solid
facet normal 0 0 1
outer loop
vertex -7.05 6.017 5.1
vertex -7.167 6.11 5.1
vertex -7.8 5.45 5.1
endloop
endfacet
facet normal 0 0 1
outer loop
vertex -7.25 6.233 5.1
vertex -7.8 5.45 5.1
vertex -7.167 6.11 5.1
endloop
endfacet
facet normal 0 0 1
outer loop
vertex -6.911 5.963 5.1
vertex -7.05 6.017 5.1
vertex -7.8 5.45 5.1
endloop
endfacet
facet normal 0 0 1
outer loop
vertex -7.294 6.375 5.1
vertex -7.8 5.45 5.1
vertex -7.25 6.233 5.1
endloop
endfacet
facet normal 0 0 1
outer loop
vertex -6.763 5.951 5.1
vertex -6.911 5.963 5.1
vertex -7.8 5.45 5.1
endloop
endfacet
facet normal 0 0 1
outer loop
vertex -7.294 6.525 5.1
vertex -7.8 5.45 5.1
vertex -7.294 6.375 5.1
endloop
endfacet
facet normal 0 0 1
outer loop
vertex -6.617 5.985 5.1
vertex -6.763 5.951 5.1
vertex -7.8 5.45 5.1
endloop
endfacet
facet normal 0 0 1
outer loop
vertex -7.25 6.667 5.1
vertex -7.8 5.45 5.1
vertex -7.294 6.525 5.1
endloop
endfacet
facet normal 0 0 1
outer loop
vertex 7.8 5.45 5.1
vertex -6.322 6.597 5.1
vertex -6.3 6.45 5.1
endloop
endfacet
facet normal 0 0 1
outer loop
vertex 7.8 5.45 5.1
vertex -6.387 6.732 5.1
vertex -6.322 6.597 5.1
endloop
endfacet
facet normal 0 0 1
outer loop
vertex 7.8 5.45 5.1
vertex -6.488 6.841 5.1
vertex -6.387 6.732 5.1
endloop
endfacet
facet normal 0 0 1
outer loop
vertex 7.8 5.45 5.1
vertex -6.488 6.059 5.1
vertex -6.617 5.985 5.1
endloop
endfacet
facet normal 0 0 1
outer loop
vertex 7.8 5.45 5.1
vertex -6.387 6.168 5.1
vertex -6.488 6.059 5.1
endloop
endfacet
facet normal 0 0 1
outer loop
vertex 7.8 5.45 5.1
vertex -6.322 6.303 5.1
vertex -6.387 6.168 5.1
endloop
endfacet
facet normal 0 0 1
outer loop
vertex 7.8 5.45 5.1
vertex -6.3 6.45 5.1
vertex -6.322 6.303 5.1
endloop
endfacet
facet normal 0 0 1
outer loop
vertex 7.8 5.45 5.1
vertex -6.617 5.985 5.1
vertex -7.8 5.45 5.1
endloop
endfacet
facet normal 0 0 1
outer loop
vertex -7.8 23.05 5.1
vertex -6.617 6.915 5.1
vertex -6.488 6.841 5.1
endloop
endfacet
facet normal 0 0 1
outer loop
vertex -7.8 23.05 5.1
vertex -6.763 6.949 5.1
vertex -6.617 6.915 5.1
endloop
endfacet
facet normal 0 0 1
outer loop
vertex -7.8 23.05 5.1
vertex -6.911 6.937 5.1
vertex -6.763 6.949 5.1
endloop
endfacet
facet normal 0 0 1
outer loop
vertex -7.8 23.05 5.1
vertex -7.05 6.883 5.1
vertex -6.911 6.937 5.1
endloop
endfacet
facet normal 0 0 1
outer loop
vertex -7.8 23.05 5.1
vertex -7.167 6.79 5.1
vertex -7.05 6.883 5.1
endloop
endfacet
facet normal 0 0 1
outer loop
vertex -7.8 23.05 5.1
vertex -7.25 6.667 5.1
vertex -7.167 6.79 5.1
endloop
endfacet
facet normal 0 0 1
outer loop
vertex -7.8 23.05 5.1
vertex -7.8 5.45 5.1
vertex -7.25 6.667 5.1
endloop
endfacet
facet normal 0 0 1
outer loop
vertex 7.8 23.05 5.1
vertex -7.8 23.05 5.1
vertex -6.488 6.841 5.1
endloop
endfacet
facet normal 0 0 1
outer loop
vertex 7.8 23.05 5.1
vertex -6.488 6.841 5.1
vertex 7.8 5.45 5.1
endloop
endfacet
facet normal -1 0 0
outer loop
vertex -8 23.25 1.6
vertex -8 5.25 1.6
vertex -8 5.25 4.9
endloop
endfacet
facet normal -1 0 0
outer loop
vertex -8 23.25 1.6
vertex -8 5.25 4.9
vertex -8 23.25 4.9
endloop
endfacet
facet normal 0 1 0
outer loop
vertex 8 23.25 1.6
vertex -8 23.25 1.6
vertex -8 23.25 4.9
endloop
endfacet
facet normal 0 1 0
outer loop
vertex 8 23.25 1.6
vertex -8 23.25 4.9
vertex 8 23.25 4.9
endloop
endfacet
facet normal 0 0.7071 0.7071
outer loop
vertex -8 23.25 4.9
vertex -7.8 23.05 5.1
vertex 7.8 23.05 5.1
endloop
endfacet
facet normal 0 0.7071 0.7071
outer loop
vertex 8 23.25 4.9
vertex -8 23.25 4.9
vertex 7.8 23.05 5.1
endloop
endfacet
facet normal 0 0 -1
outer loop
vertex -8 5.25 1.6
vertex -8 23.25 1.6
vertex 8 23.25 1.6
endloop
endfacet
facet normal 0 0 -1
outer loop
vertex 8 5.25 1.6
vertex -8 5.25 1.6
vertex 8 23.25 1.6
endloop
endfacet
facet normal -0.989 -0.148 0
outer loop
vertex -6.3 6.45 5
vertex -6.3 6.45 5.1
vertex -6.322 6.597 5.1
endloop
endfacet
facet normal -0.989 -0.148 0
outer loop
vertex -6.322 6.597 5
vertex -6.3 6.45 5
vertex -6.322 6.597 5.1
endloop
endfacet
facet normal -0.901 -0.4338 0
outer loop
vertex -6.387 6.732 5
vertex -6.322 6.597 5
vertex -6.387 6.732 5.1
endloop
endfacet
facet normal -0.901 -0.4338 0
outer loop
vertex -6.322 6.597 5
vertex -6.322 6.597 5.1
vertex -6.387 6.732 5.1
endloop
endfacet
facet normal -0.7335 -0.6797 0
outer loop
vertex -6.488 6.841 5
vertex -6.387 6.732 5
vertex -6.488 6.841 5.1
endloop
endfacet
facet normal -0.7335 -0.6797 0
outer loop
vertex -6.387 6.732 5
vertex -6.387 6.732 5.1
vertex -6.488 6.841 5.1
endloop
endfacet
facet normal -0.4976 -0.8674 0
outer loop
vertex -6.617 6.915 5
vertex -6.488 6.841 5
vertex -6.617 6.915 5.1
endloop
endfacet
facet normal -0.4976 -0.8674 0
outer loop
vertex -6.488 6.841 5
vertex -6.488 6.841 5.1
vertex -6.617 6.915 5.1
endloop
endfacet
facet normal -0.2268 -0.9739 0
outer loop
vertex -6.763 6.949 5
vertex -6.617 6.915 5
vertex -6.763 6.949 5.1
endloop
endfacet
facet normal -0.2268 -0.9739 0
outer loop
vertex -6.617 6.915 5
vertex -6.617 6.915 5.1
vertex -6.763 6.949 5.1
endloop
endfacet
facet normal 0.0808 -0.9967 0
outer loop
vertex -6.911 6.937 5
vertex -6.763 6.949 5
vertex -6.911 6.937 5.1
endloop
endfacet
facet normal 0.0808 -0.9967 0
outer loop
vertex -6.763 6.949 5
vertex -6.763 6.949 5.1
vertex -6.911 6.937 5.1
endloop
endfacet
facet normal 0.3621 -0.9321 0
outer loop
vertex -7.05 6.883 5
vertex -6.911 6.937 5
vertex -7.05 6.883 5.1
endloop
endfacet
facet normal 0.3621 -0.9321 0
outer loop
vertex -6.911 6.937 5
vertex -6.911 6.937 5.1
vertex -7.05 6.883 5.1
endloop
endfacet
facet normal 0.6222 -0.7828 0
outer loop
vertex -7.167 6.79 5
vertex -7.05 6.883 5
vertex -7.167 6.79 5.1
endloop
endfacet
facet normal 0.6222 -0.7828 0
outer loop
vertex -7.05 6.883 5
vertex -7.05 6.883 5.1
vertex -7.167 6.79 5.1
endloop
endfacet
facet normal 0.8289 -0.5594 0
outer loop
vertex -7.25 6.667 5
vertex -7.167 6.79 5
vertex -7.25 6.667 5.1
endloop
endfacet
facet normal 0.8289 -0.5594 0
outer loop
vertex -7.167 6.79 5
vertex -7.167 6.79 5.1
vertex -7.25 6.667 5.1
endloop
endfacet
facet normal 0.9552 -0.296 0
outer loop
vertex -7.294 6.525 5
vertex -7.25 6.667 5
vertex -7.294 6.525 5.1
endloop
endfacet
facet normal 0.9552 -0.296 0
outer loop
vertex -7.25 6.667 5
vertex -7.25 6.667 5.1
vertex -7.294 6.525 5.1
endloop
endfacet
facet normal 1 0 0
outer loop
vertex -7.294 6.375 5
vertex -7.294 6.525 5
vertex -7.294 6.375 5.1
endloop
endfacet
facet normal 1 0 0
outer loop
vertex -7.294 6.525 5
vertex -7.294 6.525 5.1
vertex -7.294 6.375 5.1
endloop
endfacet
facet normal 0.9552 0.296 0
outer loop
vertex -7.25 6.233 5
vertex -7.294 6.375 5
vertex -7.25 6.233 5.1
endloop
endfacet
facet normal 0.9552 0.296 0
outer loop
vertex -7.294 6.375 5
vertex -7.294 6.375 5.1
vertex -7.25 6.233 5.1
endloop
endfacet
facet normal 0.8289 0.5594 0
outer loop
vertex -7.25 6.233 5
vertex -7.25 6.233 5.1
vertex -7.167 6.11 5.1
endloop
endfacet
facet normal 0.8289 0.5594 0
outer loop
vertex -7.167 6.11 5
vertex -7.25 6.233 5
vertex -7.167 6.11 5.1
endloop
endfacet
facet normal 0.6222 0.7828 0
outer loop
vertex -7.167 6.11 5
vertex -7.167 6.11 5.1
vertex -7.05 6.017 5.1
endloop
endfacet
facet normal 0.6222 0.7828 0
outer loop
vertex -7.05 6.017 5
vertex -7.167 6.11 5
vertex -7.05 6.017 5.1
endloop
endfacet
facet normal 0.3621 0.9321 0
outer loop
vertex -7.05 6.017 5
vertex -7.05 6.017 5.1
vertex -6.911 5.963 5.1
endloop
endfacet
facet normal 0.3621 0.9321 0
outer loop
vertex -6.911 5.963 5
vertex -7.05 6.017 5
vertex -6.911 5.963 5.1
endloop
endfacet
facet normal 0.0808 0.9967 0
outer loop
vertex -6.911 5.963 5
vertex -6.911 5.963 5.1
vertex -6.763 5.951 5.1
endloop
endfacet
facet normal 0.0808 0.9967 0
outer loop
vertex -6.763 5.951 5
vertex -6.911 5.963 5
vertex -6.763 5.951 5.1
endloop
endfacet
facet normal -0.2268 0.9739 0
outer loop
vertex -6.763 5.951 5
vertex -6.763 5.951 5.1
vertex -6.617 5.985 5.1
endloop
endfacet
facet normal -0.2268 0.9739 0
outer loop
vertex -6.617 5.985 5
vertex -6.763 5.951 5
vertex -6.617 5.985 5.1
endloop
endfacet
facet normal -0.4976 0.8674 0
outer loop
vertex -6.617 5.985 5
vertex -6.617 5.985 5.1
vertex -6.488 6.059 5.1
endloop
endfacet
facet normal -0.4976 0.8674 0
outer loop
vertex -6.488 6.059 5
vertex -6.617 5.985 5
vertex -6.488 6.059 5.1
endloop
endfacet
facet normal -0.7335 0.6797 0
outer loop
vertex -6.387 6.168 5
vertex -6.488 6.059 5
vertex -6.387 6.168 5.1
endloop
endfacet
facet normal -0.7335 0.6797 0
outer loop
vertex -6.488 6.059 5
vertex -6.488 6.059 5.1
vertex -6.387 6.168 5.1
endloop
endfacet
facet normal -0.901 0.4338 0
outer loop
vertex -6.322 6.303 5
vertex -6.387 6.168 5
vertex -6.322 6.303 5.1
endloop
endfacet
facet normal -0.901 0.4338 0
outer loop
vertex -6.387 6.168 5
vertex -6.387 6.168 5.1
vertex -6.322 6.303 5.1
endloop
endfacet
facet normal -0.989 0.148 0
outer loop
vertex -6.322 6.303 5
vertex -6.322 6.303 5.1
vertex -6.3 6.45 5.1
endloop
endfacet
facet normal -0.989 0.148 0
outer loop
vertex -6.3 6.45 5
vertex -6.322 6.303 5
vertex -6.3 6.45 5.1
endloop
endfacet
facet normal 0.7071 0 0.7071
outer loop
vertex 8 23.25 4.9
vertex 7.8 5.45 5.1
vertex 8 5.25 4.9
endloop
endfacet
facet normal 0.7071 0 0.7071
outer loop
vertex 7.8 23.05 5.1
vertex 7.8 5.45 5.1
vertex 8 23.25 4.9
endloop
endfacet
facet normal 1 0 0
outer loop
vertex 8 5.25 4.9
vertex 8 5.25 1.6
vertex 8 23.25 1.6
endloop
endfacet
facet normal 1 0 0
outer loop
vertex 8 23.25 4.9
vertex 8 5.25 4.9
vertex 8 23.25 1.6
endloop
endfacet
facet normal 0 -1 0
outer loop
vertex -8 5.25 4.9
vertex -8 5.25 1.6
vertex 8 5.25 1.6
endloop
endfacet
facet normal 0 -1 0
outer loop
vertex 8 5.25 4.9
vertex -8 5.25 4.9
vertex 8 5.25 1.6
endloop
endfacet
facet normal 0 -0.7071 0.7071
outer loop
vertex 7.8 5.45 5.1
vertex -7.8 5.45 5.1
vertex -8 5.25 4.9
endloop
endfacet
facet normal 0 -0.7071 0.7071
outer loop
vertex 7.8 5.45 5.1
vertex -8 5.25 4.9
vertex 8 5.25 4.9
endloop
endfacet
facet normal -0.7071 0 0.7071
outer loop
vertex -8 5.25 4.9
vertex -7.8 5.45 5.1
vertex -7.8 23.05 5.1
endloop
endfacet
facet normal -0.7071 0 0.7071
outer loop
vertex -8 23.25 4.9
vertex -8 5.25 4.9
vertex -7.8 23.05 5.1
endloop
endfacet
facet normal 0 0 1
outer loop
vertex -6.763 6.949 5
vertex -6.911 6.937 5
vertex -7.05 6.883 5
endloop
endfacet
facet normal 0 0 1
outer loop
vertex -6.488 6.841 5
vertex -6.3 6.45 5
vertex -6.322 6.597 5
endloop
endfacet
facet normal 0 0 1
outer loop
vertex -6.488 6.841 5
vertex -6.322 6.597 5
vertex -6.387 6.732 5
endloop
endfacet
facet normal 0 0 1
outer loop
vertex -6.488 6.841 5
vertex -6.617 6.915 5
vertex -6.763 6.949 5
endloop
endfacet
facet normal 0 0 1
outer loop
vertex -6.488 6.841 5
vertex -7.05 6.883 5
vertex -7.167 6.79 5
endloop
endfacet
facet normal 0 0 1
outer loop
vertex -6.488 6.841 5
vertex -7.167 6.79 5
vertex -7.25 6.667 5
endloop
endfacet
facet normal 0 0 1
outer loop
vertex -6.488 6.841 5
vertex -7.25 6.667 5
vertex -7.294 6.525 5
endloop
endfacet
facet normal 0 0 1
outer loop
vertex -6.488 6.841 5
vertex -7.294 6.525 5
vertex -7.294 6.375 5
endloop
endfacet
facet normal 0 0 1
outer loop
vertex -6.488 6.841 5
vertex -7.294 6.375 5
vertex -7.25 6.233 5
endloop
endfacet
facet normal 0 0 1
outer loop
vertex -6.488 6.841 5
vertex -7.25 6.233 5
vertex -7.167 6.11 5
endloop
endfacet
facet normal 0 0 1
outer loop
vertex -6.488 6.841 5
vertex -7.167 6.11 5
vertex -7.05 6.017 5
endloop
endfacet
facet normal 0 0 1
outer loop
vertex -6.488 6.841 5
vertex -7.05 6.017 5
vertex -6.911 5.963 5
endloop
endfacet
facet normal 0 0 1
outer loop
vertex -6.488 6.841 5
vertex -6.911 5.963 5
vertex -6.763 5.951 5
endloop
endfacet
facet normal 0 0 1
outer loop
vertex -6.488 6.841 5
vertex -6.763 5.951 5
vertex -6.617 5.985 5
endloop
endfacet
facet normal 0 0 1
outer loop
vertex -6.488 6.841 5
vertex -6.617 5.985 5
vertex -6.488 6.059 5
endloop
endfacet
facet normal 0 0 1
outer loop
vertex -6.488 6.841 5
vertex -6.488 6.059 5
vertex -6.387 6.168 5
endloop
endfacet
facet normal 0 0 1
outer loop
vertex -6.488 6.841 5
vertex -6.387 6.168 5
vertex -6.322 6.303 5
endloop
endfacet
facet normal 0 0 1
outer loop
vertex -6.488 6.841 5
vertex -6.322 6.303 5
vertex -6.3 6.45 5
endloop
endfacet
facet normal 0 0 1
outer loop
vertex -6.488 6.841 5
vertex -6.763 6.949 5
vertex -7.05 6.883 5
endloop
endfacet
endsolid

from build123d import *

# Parameters (mm, degrees)
SKETCH001_W  = 16
SKETCH001_H  = 18
PAD001_DEPTH = 3.5
CHAMFER_SIZE = 0.2
SKETCH002_R  = 0.5
POCKET_DEPTH = 0.1


with BuildPart() as part:
    # Sketch001 (on Face1 of CopyPad) → Pad001 (new body)
    with BuildSketch(Plane.XY.offset(1.6)):
        with Locations((0, 14.25)):
            Rectangle(SKETCH001_W, SKETCH001_H)
    extrude(amount=PAD001_DEPTH)

    # Chamfer
    chamfer_edges = [part.edges().sort_by_distance(p)[0] for p in [
        (0, 23.25, 5.1),
        (8, 14.25, 5.1),
        (0, 5.25, 5.1),
        (-8, 14.25, 5.1),
    ]]
    chamfer(chamfer_edges, length=CHAMFER_SIZE)

    # Sketch002 (on Face8 of Chamfer) → Pocket (cut)
    with BuildSketch(Plane.XY.offset(5.1)):
        with Locations((-6.8, 6.45)):
            Circle(SKETCH002_R)
    extrude(amount=-POCKET_DEPTH, mode=Mode.SUBTRACT)


solid = part.part
